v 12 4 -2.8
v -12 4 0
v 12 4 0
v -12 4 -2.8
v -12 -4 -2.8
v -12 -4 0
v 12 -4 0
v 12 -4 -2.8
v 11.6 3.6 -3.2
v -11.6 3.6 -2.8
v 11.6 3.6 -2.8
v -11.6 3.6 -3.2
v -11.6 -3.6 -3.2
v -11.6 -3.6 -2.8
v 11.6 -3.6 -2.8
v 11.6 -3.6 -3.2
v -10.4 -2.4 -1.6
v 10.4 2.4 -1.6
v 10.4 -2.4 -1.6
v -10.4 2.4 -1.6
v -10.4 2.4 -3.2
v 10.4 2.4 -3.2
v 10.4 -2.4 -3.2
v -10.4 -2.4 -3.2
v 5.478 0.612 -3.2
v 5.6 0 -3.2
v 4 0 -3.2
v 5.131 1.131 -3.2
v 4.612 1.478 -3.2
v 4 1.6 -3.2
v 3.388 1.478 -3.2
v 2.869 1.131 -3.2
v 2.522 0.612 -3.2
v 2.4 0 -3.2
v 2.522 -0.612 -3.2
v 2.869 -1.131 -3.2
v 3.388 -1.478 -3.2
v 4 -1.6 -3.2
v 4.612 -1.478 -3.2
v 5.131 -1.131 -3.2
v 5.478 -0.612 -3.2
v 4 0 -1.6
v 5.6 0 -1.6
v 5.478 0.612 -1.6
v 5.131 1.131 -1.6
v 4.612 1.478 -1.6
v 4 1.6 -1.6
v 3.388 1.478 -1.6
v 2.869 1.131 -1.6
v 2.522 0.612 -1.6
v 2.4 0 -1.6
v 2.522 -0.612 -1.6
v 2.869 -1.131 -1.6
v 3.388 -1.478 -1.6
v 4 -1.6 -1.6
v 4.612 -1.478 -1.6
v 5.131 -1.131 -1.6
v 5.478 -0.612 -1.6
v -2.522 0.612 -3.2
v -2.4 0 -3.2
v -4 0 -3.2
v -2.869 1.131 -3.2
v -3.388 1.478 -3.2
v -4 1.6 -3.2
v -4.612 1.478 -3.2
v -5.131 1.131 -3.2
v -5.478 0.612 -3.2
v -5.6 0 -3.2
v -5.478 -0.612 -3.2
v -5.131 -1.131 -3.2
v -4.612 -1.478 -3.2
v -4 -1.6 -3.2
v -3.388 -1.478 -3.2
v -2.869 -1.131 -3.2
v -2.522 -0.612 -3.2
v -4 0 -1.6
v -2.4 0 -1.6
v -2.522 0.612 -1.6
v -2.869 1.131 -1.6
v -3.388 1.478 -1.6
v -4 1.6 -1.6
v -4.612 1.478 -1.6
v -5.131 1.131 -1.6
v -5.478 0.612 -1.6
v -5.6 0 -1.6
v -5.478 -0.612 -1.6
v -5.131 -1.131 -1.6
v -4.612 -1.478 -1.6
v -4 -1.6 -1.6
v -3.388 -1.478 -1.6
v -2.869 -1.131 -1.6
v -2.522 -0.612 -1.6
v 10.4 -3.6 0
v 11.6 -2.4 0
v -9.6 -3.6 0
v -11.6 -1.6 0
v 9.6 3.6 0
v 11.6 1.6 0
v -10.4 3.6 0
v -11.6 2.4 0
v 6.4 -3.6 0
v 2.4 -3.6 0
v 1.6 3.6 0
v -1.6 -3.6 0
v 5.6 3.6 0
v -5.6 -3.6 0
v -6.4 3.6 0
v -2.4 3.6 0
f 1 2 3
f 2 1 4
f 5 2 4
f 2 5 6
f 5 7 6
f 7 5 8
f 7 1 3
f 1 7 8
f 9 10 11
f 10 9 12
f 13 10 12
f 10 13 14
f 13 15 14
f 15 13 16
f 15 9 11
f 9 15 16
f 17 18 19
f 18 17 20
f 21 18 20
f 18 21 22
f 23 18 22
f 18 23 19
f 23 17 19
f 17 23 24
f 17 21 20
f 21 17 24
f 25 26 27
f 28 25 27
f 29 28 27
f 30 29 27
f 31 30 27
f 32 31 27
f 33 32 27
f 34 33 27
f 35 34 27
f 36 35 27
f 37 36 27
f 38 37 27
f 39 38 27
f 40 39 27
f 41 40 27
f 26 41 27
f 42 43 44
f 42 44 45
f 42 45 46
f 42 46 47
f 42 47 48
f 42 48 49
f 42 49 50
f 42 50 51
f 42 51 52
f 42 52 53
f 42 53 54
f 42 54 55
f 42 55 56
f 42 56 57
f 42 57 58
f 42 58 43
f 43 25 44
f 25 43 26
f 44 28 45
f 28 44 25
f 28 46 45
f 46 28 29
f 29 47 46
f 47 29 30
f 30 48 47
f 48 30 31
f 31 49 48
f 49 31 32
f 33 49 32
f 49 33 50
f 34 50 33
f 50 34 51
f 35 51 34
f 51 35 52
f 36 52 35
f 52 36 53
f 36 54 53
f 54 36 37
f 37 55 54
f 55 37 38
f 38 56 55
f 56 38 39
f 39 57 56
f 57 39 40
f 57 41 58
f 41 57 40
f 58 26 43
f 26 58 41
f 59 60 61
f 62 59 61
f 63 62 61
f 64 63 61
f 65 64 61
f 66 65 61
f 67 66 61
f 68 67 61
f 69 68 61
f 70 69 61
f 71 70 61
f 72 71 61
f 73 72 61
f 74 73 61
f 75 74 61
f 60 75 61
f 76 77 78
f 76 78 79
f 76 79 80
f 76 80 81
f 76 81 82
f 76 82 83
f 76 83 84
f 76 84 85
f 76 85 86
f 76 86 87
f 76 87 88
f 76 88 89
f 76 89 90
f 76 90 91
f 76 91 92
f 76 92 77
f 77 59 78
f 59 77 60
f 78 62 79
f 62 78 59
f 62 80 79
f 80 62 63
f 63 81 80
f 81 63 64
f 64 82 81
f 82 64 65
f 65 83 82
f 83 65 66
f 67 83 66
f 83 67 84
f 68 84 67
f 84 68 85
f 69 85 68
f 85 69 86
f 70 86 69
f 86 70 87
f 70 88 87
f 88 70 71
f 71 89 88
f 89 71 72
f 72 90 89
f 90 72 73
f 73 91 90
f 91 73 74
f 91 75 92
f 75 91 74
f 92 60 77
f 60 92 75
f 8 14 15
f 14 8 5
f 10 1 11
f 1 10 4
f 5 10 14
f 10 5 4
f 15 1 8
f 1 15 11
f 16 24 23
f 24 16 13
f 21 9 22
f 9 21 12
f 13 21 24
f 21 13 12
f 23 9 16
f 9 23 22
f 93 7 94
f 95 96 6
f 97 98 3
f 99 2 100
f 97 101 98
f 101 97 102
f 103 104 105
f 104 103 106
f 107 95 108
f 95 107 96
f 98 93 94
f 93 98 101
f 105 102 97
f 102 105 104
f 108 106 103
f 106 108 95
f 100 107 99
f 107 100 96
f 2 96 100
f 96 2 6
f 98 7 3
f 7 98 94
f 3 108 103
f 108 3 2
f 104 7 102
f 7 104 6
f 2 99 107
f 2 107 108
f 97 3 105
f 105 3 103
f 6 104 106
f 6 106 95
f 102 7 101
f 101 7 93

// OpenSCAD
// file: ../p/4-4edge.scad
use <../lib.scad>
function ldraw_lib__4_4edge() = [
// 0 Circle 1.0
// 0 Name: 4-4edge.dat
// 0 Author: James Jessiman
// 0 !LDRAW_ORG Primitive UPDATE 2017-01
// 0 !LICENSE Licensed under CC BY 2.0 and CC BY 4.0 : see CAreadme.txt
// 
// 0 BFC CERTIFY CCW
  [0,"BFC","CERTIFY"],
  [0,"BFC","CCW"],
// 
// 0 !HISTORY 1998-12-15 [PTadmin] Official Update 1998-10
// 0 !HISTORY 2005-12-28 [PTadmin] Official Update 2005-01
// 0 !HISTORY 2007-06-24 [PTadmin] Header formatted for Contributor Agreement
// 0 !HISTORY 2008-07-01 [PTadmin] Official Update 2008-01
// 0 !HISTORY 2017-01-15 [Steffen] BFCed
// 0 !HISTORY 2017-12-30 [PTadmin] Official Update 2017-01
// 
// 
// 2 24 1 0 0 0.9239 0 0.3827
  [2,24,1,0,0,0.9239,0,0.3827],
// 2 24 0.9239 0 0.3827 0.7071 0 0.7071
  [2,24,0.9239,0,0.3827,0.7071,0,0.7071],
// 2 24 0.7071 0 0.7071 0.3827 0 0.9239
  [2,24,0.7071,0,0.7071,0.3827,0,0.9239],
// 2 24 0.3827 0 0.9239 0 0 1
  [2,24,0.3827,0,0.9239,0,0,1],
// 2 24 0 0 1 -0.3827 0 0.9239
  [2,24,0,0,1,-0.3827,0,0.9239],
// 2 24 -0.3827 0 0.9239 -0.7071 0 0.7071
  [2,24,-0.3827,0,0.9239,-0.7071,0,0.7071],
// 2 24 -0.7071 0 0.7071 -0.9239 0 0.3827
  [2,24,-0.7071,0,0.7071,-0.9239,0,0.3827],
// 2 24 -0.9239 0 0.3827 -1 0 -0
  [2,24,-0.9239,0,0.3827,-1,0,-0],
// 2 24 -1 0 -0 -0.9239 0 -0.3827
  [2,24,-1,0,-0,-0.9239,0,-0.3827],
// 2 24 -0.9239 0 -0.3827 -0.7071 0 -0.7071
  [2,24,-0.9239,0,-0.3827,-0.7071,0,-0.7071],
// 2 24 -0.7071 0 -0.7071 -0.3827 0 -0.9239
  [2,24,-0.7071,0,-0.7071,-0.3827,0,-0.9239],
// 2 24 -0.3827 0 -0.9239 0 0 -1
  [2,24,-0.3827,0,-0.9239,0,0,-1],
// 2 24 0 0 -1 0.3827 0 -0.9239
  [2,24,0,0,-1,0.3827,0,-0.9239],
// 2 24 0.3827 0 -0.9239 0.7071 0 -0.7071
  [2,24,0.3827,0,-0.9239,0.7071,0,-0.7071],
// 2 24 0.7071 0 -0.7071 0.9239 0 -0.3827
  [2,24,0.7071,0,-0.7071,0.9239,0,-0.3827],
// 2 24 0.9239 0 -0.3827 1 0 0
  [2,24,0.9239,0,-0.3827,1,0,0],
];
module ldraw_lib__4_4edge(step=0, col=false, unit=2/5, alt=false, line=0.2, solid=!$preview)
    makepoly(ldraw_lib__4_4edge(), step=step, col=col, unit=unit, alt=alt, line=line, solid=solid);
ldraw_lib__4_4edge(line=0.2);
// file: ../p/4-4disc.scad
use <../lib.scad>
function ldraw_lib__4_4disc() = [
// 0 Disc 1.0
// 0 Name: 4-4disc.dat
// 0 Author: James Jessiman
// 0 !LDRAW_ORG Primitive UPDATE 2002-02
// 0 !LICENSE Licensed under CC BY 2.0 and CC BY 4.0 : see CAreadme.txt
// 
// 0 BFC CERTIFY CCW
  [0,"BFC","CERTIFY"],
  [0,"BFC","CCW"],
// 
// 0 !HISTORY 1998-12-15 [PTadmin] Official Update 1998-10
// 0 !HISTORY 2002-03-23 [sbliss] Added BFC statement
// 0 !HISTORY 2002-04-25 [PTadmin] Official Update 2002-02
// 0 !HISTORY 2007-06-24 [PTadmin] Header formatted for Contributor Agreement
// 0 !HISTORY 2008-07-01 [PTadmin] Official Update 2008-01
// 
// 
// 3 16 0 0 0 1 0 0 0.9239 0 0.3827
  [3,16,0,0,0,1,0,0,0.9239,0,0.3827],
// 3 16 0 0 0 0.9239 0 0.3827 0.7071 0 0.7071
  [3,16,0,0,0,0.9239,0,0.3827,0.7071,0,0.7071],
// 3 16 0 0 0 0.7071 0 0.7071 0.3827 0 0.9239
  [3,16,0,0,0,0.7071,0,0.7071,0.3827,0,0.9239],
// 3 16 0 0 0 0.3827 0 0.9239 0 0 1
  [3,16,0,0,0,0.3827,0,0.9239,0,0,1],
// 3 16 0 0 0 0 0 1 -0.3827 0 0.9239
  [3,16,0,0,0,0,0,1,-0.3827,0,0.9239],
// 3 16 0 0 0 -0.3827 0 0.9239 -0.7071 0 0.7071
  [3,16,0,0,0,-0.3827,0,0.9239,-0.7071,0,0.7071],
// 3 16 0 0 0 -0.7071 0 0.7071 -0.9239 0 0.3827
  [3,16,0,0,0,-0.7071,0,0.7071,-0.9239,0,0.3827],
// 3 16 0 0 0 -0.9239 0 0.3827 -1 0 -0
  [3,16,0,0,0,-0.9239,0,0.3827,-1,0,-0],
// 3 16 0 0 0 -1 0 -0 -0.9239 0 -0.3827
  [3,16,0,0,0,-1,0,-0,-0.9239,0,-0.3827],
// 3 16 0 0 0 -0.9239 0 -0.3827 -0.7071 0 -0.7071
  [3,16,0,0,0,-0.9239,0,-0.3827,-0.7071,0,-0.7071],
// 3 16 0 0 0 -0.7071 0 -0.7071 -0.3827 0 -0.9239
  [3,16,0,0,0,-0.7071,0,-0.7071,-0.3827,0,-0.9239],
// 3 16 0 0 0 -0.3827 0 -0.9239 0 0 -1
  [3,16,0,0,0,-0.3827,0,-0.9239,0,0,-1],
// 3 16 0 0 0 0 0 -1 0.3827 0 -0.9239
  [3,16,0,0,0,0,0,-1,0.3827,0,-0.9239],
// 3 16 0 0 0 0.3827 0 -0.9239 0.7071 0 -0.7071
  [3,16,0,0,0,0.3827,0,-0.9239,0.7071,0,-0.7071],
// 3 16 0 0 0 0.7071 0 -0.7071 0.9239 0 -0.3827
  [3,16,0,0,0,0.7071,0,-0.7071,0.9239,0,-0.3827],
// 3 16 0 0 0 0.9239 0 -0.3827 1 0 0
  [3,16,0,0,0,0.9239,0,-0.3827,1,0,0],
// 0
];
module ldraw_lib__4_4disc(step=0, col=false, unit=2/5, alt=false, line=0.2, solid=!$preview)
    makepoly(ldraw_lib__4_4disc(), step=step, col=col, unit=unit, alt=alt, line=line, solid=solid);
ldraw_lib__4_4disc(line=0.2);
// file: ../p/4-4cyli.scad
use <../lib.scad>
$fa=1; $fs=0.2;
function ldraw_lib__4_4cyli(realsolid=false) = [
// 0 Cylinder 1.0
// 0 Name: 4-4cyli.dat
// 0 Author: James Jessiman
// 0 !LDRAW_ORG Primitive UPDATE 2005-01
// 0 !LICENSE Licensed under CC BY 2.0 and CC BY 4.0 : see CAreadme.txt
// 
// 0 BFC CERTIFY CCW
  [0,"BFC","CERTIFY"],
  [0,"BFC","CCW"],
// 
// 0 !HISTORY 1998-12-15 [PTadmin] Official Update 1998-10
// 0 !HISTORY 2002-03-23 [sbliss] Added BFC statement; merged headers from files in distributions LDraw 0.27 and Complete.
// 0 !HISTORY 2002-04-25 [PTadmin] Official Update 2002-02
// 0 !HISTORY 2004-12-14 [guyvivan] BFC CCW
// 0 !HISTORY 2005-12-28 [PTadmin] Official Update 2005-01
// 0 !HISTORY 2007-06-24 [PTadmin] Header formatted for Contributor Agreement
// 0 !HISTORY 2008-07-01 [PTadmin] Official Update 2008-01
// 
// 
// 4 16 1 1 0 0.9239 1 0.3827 0.9239 0 0.3827 1 0 0
  [4,16,1,1,0,0.9239,1,0.3827,0.9239,0,0.3827,1,0,0],
// 5 24 1 0 0 1 1 0 0.9239 0 0.3827 0.9239 0 -0.3827
  [5,24,1,0,0,1,1,0,0.9239,0,0.3827,0.9239,0,-0.3827],
// 4 16 0.9239 1 0.3827 0.7071 1 0.7071 0.7071 0 0.7071 0.9239 0 0.3827
  [4,16,0.9239,1,0.3827,0.7071,1,0.7071,0.7071,0,0.7071,0.9239,0,0.3827],
// 5 24 0.9239 0 0.3827 0.9239 1 0.3827 0.7071 0 0.7071 1 0 0
  [5,24,0.9239,0,0.3827,0.9239,1,0.3827,0.7071,0,0.7071,1,0,0],
// 4 16 0.7071 1 0.7071 0.3827 1 0.9239 0.3827 0 0.9239 0.7071 0 0.7071
  [4,16,0.7071,1,0.7071,0.3827,1,0.9239,0.3827,0,0.9239,0.7071,0,0.7071],
// 5 24 0.7071 0 0.7071 0.7071 1 0.7071 0.3827 0 0.9239 0.9239 0 0.3827
  [5,24,0.7071,0,0.7071,0.7071,1,0.7071,0.3827,0,0.9239,0.9239,0,0.3827],
// 4 16 0.3827 1 0.9239 0 1 1 0 0 1 0.3827 0 0.9239
  [4,16,0.3827,1,0.9239,0,1,1,0,0,1,0.3827,0,0.9239],
// 5 24 0.3827 0 0.9239 0.3827 1 0.9239 0 0 1 0.7071 0 0.7071
  [5,24,0.3827,0,0.9239,0.3827,1,0.9239,0,0,1,0.7071,0,0.7071],
// 4 16 0 1 1 -0.3827 1 0.9239 -0.3827 0 0.9239 0 0 1
  [4,16,0,1,1,-0.3827,1,0.9239,-0.3827,0,0.9239,0,0,1],
// 5 24 0 0 1 0 1 1 -0.3827 0 0.9239 0.3827 0 0.9239
  [5,24,0,0,1,0,1,1,-0.3827,0,0.9239,0.3827,0,0.9239],
// 4 16 -0.3827 1 0.9239 -0.7071 1 0.7071 -0.7071 0 0.7071 -0.3827 0 0.9239
  [4,16,-0.3827,1,0.9239,-0.7071,1,0.7071,-0.7071,0,0.7071,-0.3827,0,0.9239],
// 5 24 -0.3827 0 0.9239 -0.3827 1 0.9239 -0.7071 0 0.7071 0 0 1
  [5,24,-0.3827,0,0.9239,-0.3827,1,0.9239,-0.7071,0,0.7071,0,0,1],
// 4 16 -0.7071 1 0.7071 -0.9239 1 0.3827 -0.9239 0 0.3827 -0.7071 0 0.7071
  [4,16,-0.7071,1,0.7071,-0.9239,1,0.3827,-0.9239,0,0.3827,-0.7071,0,0.7071],
// 5 24 -0.7071 0 0.7071 -0.7071 1 0.7071 -0.9239 0 0.3827 -0.3827 0 0.9239
  [5,24,-0.7071,0,0.7071,-0.7071,1,0.7071,-0.9239,0,0.3827,-0.3827,0,0.9239],
// 4 16 -0.9239 1 0.3827 -1 1 0 -1 0 0 -0.9239 0 0.3827
  [4,16,-0.9239,1,0.3827,-1,1,0,-1,0,0,-0.9239,0,0.3827],
// 5 24 -0.9239 0 0.3827 -0.9239 1 0.3827 -1 0 0 -0.7071 0 0.7071
  [5,24,-0.9239,0,0.3827,-0.9239,1,0.3827,-1,0,0,-0.7071,0,0.7071],
// 4 16 -1 1 0 -0.9239 1 -0.3827 -0.9239 0 -0.3827 -1 0 0
  [4,16,-1,1,0,-0.9239,1,-0.3827,-0.9239,0,-0.3827,-1,0,0],
// 5 24 -1 0 0 -1 1 0 -0.9239 0 -0.3827 -0.9239 0 0.3827
  [5,24,-1,0,0,-1,1,0,-0.9239,0,-0.3827,-0.9239,0,0.3827],
// 4 16 -0.9239 1 -0.3827 -0.7071 1 -0.7071 -0.7071 0 -0.7071 -0.9239 0 -0.3827
  [4,16,-0.9239,1,-0.3827,-0.7071,1,-0.7071,-0.7071,0,-0.7071,-0.9239,0,-0.3827],
// 5 24 -0.9239 0 -0.3827 -0.9239 1 -0.3827 -0.7071 0 -0.7071 -1 0 0
  [5,24,-0.9239,0,-0.3827,-0.9239,1,-0.3827,-0.7071,0,-0.7071,-1,0,0],
// 4 16 -0.7071 1 -0.7071 -0.3827 1 -0.9239 -0.3827 0 -0.9239 -0.7071 0 -0.7071
  [4,16,-0.7071,1,-0.7071,-0.3827,1,-0.9239,-0.3827,0,-0.9239,-0.7071,0,-0.7071],
// 5 24 -0.7071 0 -0.7071 -0.7071 1 -0.7071 -0.3827 0 -0.9239 -0.9239 0 -0.3827
  [5,24,-0.7071,0,-0.7071,-0.7071,1,-0.7071,-0.3827,0,-0.9239,-0.9239,0,-0.3827],
// 4 16 -0.3827 1 -0.9239 0 1 -1 0 0 -1 -0.3827 0 -0.9239
  [4,16,-0.3827,1,-0.9239,0,1,-1,0,0,-1,-0.3827,0,-0.9239],
// 5 24 -0.3827 0 -0.9239 -0.3827 1 -0.9239 0 0 -1 -0.7071 0 -0.7071
  [5,24,-0.3827,0,-0.9239,-0.3827,1,-0.9239,0,0,-1,-0.7071,0,-0.7071],
// 4 16 0 1 -1 0.3827 1 -0.9239 0.3827 0 -0.9239 0 0 -1
  [4,16,0,1,-1,0.3827,1,-0.9239,0.3827,0,-0.9239,0,0,-1],
// 5 24 0 0 -1 0 1 -1 0.3827 0 -0.9239 -0.3827 0 -0.9239
  [5,24,0,0,-1,0,1,-1,0.3827,0,-0.9239,-0.3827,0,-0.9239],
// 4 16 0.3827 1 -0.9239 0.7071 1 -0.7071 0.7071 0 -0.7071 0.3827 0 -0.9239
  [4,16,0.3827,1,-0.9239,0.7071,1,-0.7071,0.7071,0,-0.7071,0.3827,0,-0.9239],
// 5 24 0.3827 0 -0.9239 0.3827 1 -0.9239 0.7071 0 -0.7071 0 0 -1
  [5,24,0.3827,0,-0.9239,0.3827,1,-0.9239,0.7071,0,-0.7071,0,0,-1],
// 4 16 0.7071 1 -0.7071 0.9239 1 -0.3827 0.9239 0 -0.3827 0.7071 0 -0.7071
  [4,16,0.7071,1,-0.7071,0.9239,1,-0.3827,0.9239,0,-0.3827,0.7071,0,-0.7071],
// 5 24 0.7071 0 -0.7071 0.7071 1 -0.7071 0.9239 0 -0.3827 0.3827 0 -0.9239
  [5,24,0.7071,0,-0.7071,0.7071,1,-0.7071,0.9239,0,-0.3827,0.3827,0,-0.9239],
// 4 16 0.9239 1 -0.3827 1 1 0 1 0 0 0.9239 0 -0.3827
  [4,16,0.9239,1,-0.3827,1,1,0,1,0,0,0.9239,0,-0.3827],
// 5 24 0.9239 0 -0.3827 0.9239 1 -0.3827 1 0 0 0.7071 0 -0.7071
  [5,24,0.9239,0,-0.3827,0.9239,1,-0.3827,1,0,0,0.7071,0,-0.7071],
// 0
];
module ldraw_lib__4_4cyli(step=0, col=false, unit=2/5, alt=false, line=0.2, solid=!$preview)
    makepoly(ldraw_lib__4_4cyli(solid), step=step, col=col, unit=unit, alt=alt, line=line, solid=solid);
ldraw_lib__4_4cyli(line=0.2);
// file: ../p/stud3.scad
use <../lib.scad>
use <4-4cyli.scad>
use <4-4disc.scad>
use <4-4edge.scad>
function ldraw_lib__stud3() = [
// 0 Stud Tube Solid
// 0 Name: stud3.dat
// 0 Author: James Jessiman
// 0 !LDRAW_ORG Primitive UPDATE 2012-01
// 0 !LICENSE Licensed under CC BY 4.0 : see CAreadme.txt
// 
// 0 BFC CERTIFY CCW
  [0,"BFC","CERTIFY"],
  [0,"BFC","CCW"],
// 
// 0 !HISTORY 2002-04-04 [sbliss] Modified for BFC compliance
// 0 !HISTORY 2002-04-25 [PTadmin] Official Update 2002-02
// 0 !HISTORY 2007-06-24 [PTadmin] Header formatted for Contributor Agreement
// 0 !HISTORY 2008-07-01 [PTadmin] Official Update 2008-01
// 0 !HISTORY 2012-02-16 [Philo] Changed to CCW
// 0 !HISTORY 2012-03-30 [PTadmin] Official Update 2012-01
// 
// 
// 1 16 0 -4 0 4 0 0 0 1 0 0 0 4 4-4edge.dat
  [1,16,0,-4,0,4,0,0,0,1,0,0,0,4, ldraw_lib__4_4edge()],
// 1 16 0 0 0 4 0 0 0 1 0 0 0 4 4-4edge.dat
  [1,16,0,0,0,4,0,0,0,1,0,0,0,4, ldraw_lib__4_4edge()],
// 1 16 0 -4 0 4 0 0 0 1 0 0 0 4 4-4disc.dat
  [1,16,0,-4,0,4,0,0,0,1,0,0,0,4, ldraw_lib__4_4disc()],
  [-1,16,0,0,0,4,0,0,0,-1,0,0,0,4, ldraw_lib__4_4disc()],
// 1 16 0 -4 0 4 0 0 0 4 0 0 0 4 4-4cyli.dat
  [1,16,0,-4,0,4,0,0,0,4,0,0,0,4, ldraw_lib__4_4cyli()],
];
module ldraw_lib__stud3(step=0, col=false, unit=2/5, alt=false, line=0.2, solid=!$preview)
    makepoly(ldraw_lib__stud3(), step=step, col=col, unit=unit, alt=alt, line=line, solid=solid);
ldraw_lib__stud3(line=0.2);
// file: ../p/box5.scad
use <../lib.scad>
function ldraw_lib__box5() = [
// 0 Box with 5 Faces and All Edges
// 0 Name: box5.dat
// 0 Author: James Jessiman
// 0 !LDRAW_ORG Primitive UPDATE 2012-01
// 0 !LICENSE Licensed under CC BY 2.0 and CC BY 4.0 : see CAreadme.txt
// 
// 0 BFC CERTIFY CCW
  [0,"BFC","CERTIFY"],
  [0,"BFC","CCW"],
// 
// 0 !HISTORY 2002-04-03 [sbliss] Modified for BFC compliance
// 0 !HISTORY 2002-04-25 [PTadmin] Official Update 2002-02
// 0 !HISTORY 2007-06-24 [PTadmin] Header formatted for Contributor Agreement
// 0 !HISTORY 2008-07-01 [PTadmin] Official Update 2008-01
// 0 !HISTORY 2012-02-16 [Philo] Changed to CCW
// 0 !HISTORY 2012-03-30 [PTadmin] Official Update 2012-01
// 
// 
// 2 24 1 1 1 -1 1 1
  [2,24,1,1,1,-1,1,1],
// 2 24 -1 1 1 -1 1 -1
  [2,24,-1,1,1,-1,1,-1],
// 2 24 -1 1 -1 1 1 -1
  [2,24,-1,1,-1,1,1,-1],
// 2 24 1 1 -1 1 1 1
  [2,24,1,1,-1,1,1,1],
// 2 24 1 0 1 -1 0 1
  [2,24,1,0,1,-1,0,1],
// 2 24 -1 0 1 -1 0 -1
  [2,24,-1,0,1,-1,0,-1],
// 2 24 -1 0 -1 1 0 -1
  [2,24,-1,0,-1,1,0,-1],
// 2 24 1 0 -1 1 0 1
  [2,24,1,0,-1,1,0,1],
// 2 24 1 0 1 1 1 1
  [2,24,1,0,1,1,1,1],
// 2 24 -1 0 1 -1 1 1
  [2,24,-1,0,1,-1,1,1],
// 2 24 1 0 -1 1 1 -1
  [2,24,1,0,-1,1,1,-1],
// 2 24 -1 0 -1 -1 1 -1
  [2,24,-1,0,-1,-1,1,-1],
// 4 16 -1 1 1 1 1 1 1 1 -1 -1 1 -1
  [4,16,-1,1,1,1,1,1,1,1,-1,-1,1,-1],
// 4 16 -1 1 1 -1 0 1 1 0 1 1 1 1
  [4,16,-1,1,1,-1,0,1,1,0,1,1,1,1],
// 4 16 -1 1 -1 -1 0 -1 -1 0 1 -1 1 1
  [4,16,-1,1,-1,-1,0,-1,-1,0,1,-1,1,1],
// 4 16 1 1 -1 1 0 -1 -1 0 -1 -1 1 -1
  [4,16,1,1,-1,1,0,-1,-1,0,-1,-1,1,-1],
// 4 16 1 1 1 1 0 1 1 0 -1 1 1 -1
  [4,16,1,1,1,1,0,1,1,0,-1,1,1,-1],
];
makepoly(ldraw_lib__box5(), line=0.2);
// file: ../p/box4.scad
use <../lib.scad>
function ldraw_lib__box4() = [
// 0 Box with 4 Faces (2 Parallel Pairs) and All Edges
// 0 Name: box4.dat
// 0 Author: James Jessiman
// 0 !LDRAW_ORG Primitive UPDATE 2012-01
// 0 !LICENSE Licensed under CC BY 4.0 : see CAreadme.txt
// 
// 0 BFC CERTIFY CCW
  [0,"BFC","CERTIFY"],
  [0,"BFC","CCW"],
// 
// 0 !HISTORY 2002-04-03 [sbliss] Modified for BFC compliance
// 0 !HISTORY 2002-04-25 [PTadmin] Official Update 2002-02
// 0 !HISTORY 2007-06-24 [PTadmin] Header formatted for Contributor Agreement
// 0 !HISTORY 2008-07-01 [PTadmin] Official Update 2008-01
// 0 !HISTORY 2012-02-16 [Philo] Changed to CCW
// 0 !HISTORY 2012-03-30 [PTadmin] Official Update 2012-01
// 
// 
// 2 24 1 1 1 -1 1 1
  [2,24,1,1,1,-1,1,1],
// 2 24 -1 1 1 -1 1 -1
  [2,24,-1,1,1,-1,1,-1],
// 2 24 -1 1 -1 1 1 -1
  [2,24,-1,1,-1,1,1,-1],
// 2 24 1 1 -1 1 1 1
  [2,24,1,1,-1,1,1,1],
// 2 24 1 0 1 -1 0 1
  [2,24,1,0,1,-1,0,1],
// 2 24 -1 0 1 -1 0 -1
  [2,24,-1,0,1,-1,0,-1],
// 2 24 -1 0 -1 1 0 -1
  [2,24,-1,0,-1,1,0,-1],
// 2 24 1 0 -1 1 0 1
  [2,24,1,0,-1,1,0,1],
// 2 24 1 0 1 1 1 1
  [2,24,1,0,1,1,1,1],
// 2 24 -1 0 1 -1 1 1
  [2,24,-1,0,1,-1,1,1],
// 2 24 1 0 -1 1 1 -1
  [2,24,1,0,-1,1,1,-1],
// 2 24 -1 0 -1 -1 1 -1
  [2,24,-1,0,-1,-1,1,-1],
// 4 16 -1 1 1 -1 0 1 1 0 1 1 1 1
  [4,16,-1,1,1,-1,0,1,1,0,1,1,1,1],
// 4 16 -1 1 -1 -1 0 -1 -1 0 1 -1 1 1
  [4,16,-1,1,-1,-1,0,-1,-1,0,1,-1,1,1],
// 4 16 1 1 -1 1 0 -1 -1 0 -1 -1 1 -1
  [4,16,1,1,-1,1,0,-1,-1,0,-1,-1,1,-1],
// 4 16 1 1 1 1 0 1 1 0 -1 1 1 -1
  [4,16,1,1,1,1,0,1,1,0,-1,1,1,-1],
];
module ldraw_lib__box4(step=0, col=false, unit=2/5, alt=false, line=0.2, solid=!$preview)
    makepoly(ldraw_lib__box4(), step=step, col=col, unit=unit, alt=alt, line=line, solid=solid);
ldraw_lib__box4(line=0.2);
// file: s/63864s01.scad
use <../../lib.scad>
use <../../p/box4.scad>
use <../../p/box5.scad>
use <../../p/stud3.scad>
function ldraw_lib__s__63864s01() = [
// 0 ~Tile  1 x  3 without Top Face
// 0 Name: s\63864s01.dat
// 0 Author: Ulrich Röder [UR]
// 0 !LDRAW_ORG Subpart UPDATE 2019-01
// 0 !LICENSE Licensed under CC BY 4.0 : see CAreadme.txt
// 
// 0 BFC CERTIFY CCW
  [0,"BFC","CERTIFY"],
  [0,"BFC","CCW"],
// 
// 0 !HISTORY 2019-06-28 [PTadmin] Official Update 2019-01
// 
// 
// 1 16 0 0 0 30 0 0 0 7 0 0 0 10 box4.dat
  [1,16,0,0,0,30,0,0,0,7,0,0,0,10, ldraw_lib__box4()],
// 1 16 0 7 0 29 0 0 0 1 0 0 0 9 box4.dat
  [1,16,0,7,0,29,0,0,0,1,0,0,0,9, ldraw_lib__box4()],
// 0 BFC INVERTNEXT
  [0,"BFC","INVERTNEXT"],
// 1 16 0 8 0 -26 0 0 0 -4 0 0 0 6 box5.dat
  [1,16,0,8,0,-26,0,0,0,-4,0,0,0,6, ldraw_lib__box5()],
// 1 16 10 4 0 1 0 0 0 -1 0 0 0 1 stud3.dat
  [1,16,10,4,0,1,0,0,0,-1,0,0,0,1, ldraw_lib__stud3()],
// 1 16 -10 4 0 1 0 0 0 -1 0 0 0 1 stud3.dat
  [1,16,-10,4,0,1,0,0,0,-1,0,0,0,1, ldraw_lib__stud3()],
// 4 16 -30 7 -10 -29 7 -9 29 7 -9 30 7 -10
  [4,16,-30,7,-10,-29,7,-9,29,7,-9,30,7,-10],
// 4 16 30 7 10 29 7 9 -29 7 9 -30 7 10
  [4,16,30,7,10,29,7,9,-29,7,9,-30,7,10],
// 4 16 -30 7 -10 -30 7 10 -29 7 9 -29 7 -9
  [4,16,-30,7,-10,-30,7,10,-29,7,9,-29,7,-9],
// 4 16 30 7 10 30 7 -10 29 7 -9 29 7 9
  [4,16,30,7,10,30,7,-10,29,7,-9,29,7,9],
// 4 16 -29 8 -9 -26 8 -6 26 8 -6 29 8 -9
  [4,16,-29,8,-9,-26,8,-6,26,8,-6,29,8,-9],
// 4 16 29 8 9 26 8 6 -26 8 6 -29 8 9
  [4,16,29,8,9,26,8,6,-26,8,6,-29,8,9],
// 4 16 -29 8 -9 -29 8 9 -26 8 6 -26 8 -6
  [4,16,-29,8,-9,-29,8,9,-26,8,6,-26,8,-6],
// 4 16 29 8 9 29 8 -9 26 8 -6 26 8 6
  [4,16,29,8,9,29,8,-9,26,8,-6,26,8,6],
];
module ldraw_lib__s__63864s01(step=0, col=false, unit=2/5, alt=false, line=0.2, solid=!$preview)
    makepoly(ldraw_lib__s__63864s01(), step=step, col=col, unit=unit, alt=alt, line=line, solid=solid);
ldraw_lib__s__63864s01(line=0.2);
// main file
use <../lib.scad>
use <s/63864s01.scad>
function ldraw_lib__63864p05() = [
// 0 Tile  1 x  3 with Black Danger Stripes Pattern
// 0 Name: 63864p05.dat
// 0 Author: Marc Giraudet [Mad_Marc]
// 0 !LDRAW_ORG Part UPDATE 2024-03
// 0 !LICENSE Licensed under CC BY 4.0 : see CAreadme.txt
// 
// 0 BFC CERTIFY CCW
  [0,"BFC","CERTIFY"],
  [0,"BFC","CCW"],
// 
// 0 !KEYWORDS BrickLink 63864pb128, Set 10274
// 
// 0 !HISTORY 2024-04-28 [OrionP] Official Update 2024-03
// 
// 1 16 0 0 0 1 0 0 0 1 0 0 0 1 s\63864s01.dat
  [1,16,0,0,0,1,0,0,0,1,0,0,0,1, ldraw_lib__s__63864s01()],
// 
// 3 16 26 0 -9 30 0 -10 29 0 -6
  [3,16,26,0,-9,30,0,-10,29,0,-6],
// 3 16 -24 0 -9 -29 0 -4 -30 0 -10
  [3,16,-24,0,-9,-29,0,-4,-30,0,-10],
// 3 16 24 0 9 29 0 4 30 0 10
  [3,16,24,0,9,29,0,4,30,0,10],
// 3 16 -26 0 9 -30 0 10 -29 0 6
  [3,16,-26,0,9,-30,0,10,-29,0,6],
// 4 16 24 0 9 6 0 -9 16 0 -9 29 0 4
  [4,16,24,0,9,6,0,-9,16,0,-9,29,0,4],
// 4 16 4 0 9 -14 0 -9 -4 0 -9 14 0 9
  [4,16,4,0,9,-14,0,-9,-4,0,-9,14,0,9],
// 4 16 -16 0 9 -29 0 -4 -24 0 -9 -6 0 9
  [4,16,-16,0,9,-29,0,-4,-24,0,-9,-6,0,9],
// 4 0 29 0 4 16 0 -9 26 0 -9 29 0 -6
  [4,0,29,0,4,16,0,-9,26,0,-9,29,0,-6],
// 4 0 14 0 9 -4 0 -9 6 0 -9 24 0 9
  [4,0,14,0,9,-4,0,-9,6,0,-9,24,0,9],
// 4 0 -6 0 9 -24 0 -9 -14 0 -9 4 0 9
  [4,0,-6,0,9,-24,0,-9,-14,0,-9,4,0,9],
// 4 0 -26 0 9 -29 0 6 -29 0 -4 -16 0 9
  [4,0,-26,0,9,-29,0,6,-29,0,-4,-16,0,9],
// 4 16 -30 0 10 -30 0 -10 -29 0 -4 -29 0 6
  [4,16,-30,0,10,-30,0,-10,-29,0,-4,-29,0,6],
// 4 16 30 0 10 29 0 4 29 0 -6 30 0 -10
  [4,16,30,0,10,29,0,4,29,0,-6,30,0,-10],
// 4 16 -30 0 10 -6 0 9 4 0 9 30 0 10
  [4,16,-30,0,10,-6,0,9,4,0,9,30,0,10],
// 4 16 -4 0 -9 -30 0 -10 30 0 -10 6 0 -9
  [4,16,-4,0,-9,-30,0,-10,30,0,-10,6,0,-9],
// 3 16 -30 0 10 -26 0 9 -16 0 9
  [3,16,-30,0,10,-26,0,9,-16,0,9],
// 3 16 -30 0 10 -16 0 9 -6 0 9
  [3,16,-30,0,10,-16,0,9,-6,0,9],
// 3 16 24 0 9 30 0 10 14 0 9
  [3,16,24,0,9,30,0,10,14,0,9],
// 3 16 14 0 9 30 0 10 4 0 9
  [3,16,14,0,9,30,0,10,4,0,9],
// 3 16 -30 0 -10 -4 0 -9 -14 0 -9
  [3,16,-30,0,-10,-4,0,-9,-14,0,-9],
// 3 16 -30 0 -10 -14 0 -9 -24 0 -9
  [3,16,-30,0,-10,-14,0,-9,-24,0,-9],
// 3 16 6 0 -9 30 0 -10 16 0 -9
  [3,16,6,0,-9,30,0,-10,16,0,-9],
// 3 16 16 0 -9 30 0 -10 26 0 -9
  [3,16,16,0,-9,30,0,-10,26,0,-9],
];
module ldraw_lib__63864p05(step=0, col=false, unit=2/5, alt=false, line=0.2, solid=!$preview)
    makepoly(ldraw_lib__63864p05(), step=step, col=col, unit=unit, alt=alt, line=line, solid=solid);
ldraw_lib__63864p05(line=0.2);
